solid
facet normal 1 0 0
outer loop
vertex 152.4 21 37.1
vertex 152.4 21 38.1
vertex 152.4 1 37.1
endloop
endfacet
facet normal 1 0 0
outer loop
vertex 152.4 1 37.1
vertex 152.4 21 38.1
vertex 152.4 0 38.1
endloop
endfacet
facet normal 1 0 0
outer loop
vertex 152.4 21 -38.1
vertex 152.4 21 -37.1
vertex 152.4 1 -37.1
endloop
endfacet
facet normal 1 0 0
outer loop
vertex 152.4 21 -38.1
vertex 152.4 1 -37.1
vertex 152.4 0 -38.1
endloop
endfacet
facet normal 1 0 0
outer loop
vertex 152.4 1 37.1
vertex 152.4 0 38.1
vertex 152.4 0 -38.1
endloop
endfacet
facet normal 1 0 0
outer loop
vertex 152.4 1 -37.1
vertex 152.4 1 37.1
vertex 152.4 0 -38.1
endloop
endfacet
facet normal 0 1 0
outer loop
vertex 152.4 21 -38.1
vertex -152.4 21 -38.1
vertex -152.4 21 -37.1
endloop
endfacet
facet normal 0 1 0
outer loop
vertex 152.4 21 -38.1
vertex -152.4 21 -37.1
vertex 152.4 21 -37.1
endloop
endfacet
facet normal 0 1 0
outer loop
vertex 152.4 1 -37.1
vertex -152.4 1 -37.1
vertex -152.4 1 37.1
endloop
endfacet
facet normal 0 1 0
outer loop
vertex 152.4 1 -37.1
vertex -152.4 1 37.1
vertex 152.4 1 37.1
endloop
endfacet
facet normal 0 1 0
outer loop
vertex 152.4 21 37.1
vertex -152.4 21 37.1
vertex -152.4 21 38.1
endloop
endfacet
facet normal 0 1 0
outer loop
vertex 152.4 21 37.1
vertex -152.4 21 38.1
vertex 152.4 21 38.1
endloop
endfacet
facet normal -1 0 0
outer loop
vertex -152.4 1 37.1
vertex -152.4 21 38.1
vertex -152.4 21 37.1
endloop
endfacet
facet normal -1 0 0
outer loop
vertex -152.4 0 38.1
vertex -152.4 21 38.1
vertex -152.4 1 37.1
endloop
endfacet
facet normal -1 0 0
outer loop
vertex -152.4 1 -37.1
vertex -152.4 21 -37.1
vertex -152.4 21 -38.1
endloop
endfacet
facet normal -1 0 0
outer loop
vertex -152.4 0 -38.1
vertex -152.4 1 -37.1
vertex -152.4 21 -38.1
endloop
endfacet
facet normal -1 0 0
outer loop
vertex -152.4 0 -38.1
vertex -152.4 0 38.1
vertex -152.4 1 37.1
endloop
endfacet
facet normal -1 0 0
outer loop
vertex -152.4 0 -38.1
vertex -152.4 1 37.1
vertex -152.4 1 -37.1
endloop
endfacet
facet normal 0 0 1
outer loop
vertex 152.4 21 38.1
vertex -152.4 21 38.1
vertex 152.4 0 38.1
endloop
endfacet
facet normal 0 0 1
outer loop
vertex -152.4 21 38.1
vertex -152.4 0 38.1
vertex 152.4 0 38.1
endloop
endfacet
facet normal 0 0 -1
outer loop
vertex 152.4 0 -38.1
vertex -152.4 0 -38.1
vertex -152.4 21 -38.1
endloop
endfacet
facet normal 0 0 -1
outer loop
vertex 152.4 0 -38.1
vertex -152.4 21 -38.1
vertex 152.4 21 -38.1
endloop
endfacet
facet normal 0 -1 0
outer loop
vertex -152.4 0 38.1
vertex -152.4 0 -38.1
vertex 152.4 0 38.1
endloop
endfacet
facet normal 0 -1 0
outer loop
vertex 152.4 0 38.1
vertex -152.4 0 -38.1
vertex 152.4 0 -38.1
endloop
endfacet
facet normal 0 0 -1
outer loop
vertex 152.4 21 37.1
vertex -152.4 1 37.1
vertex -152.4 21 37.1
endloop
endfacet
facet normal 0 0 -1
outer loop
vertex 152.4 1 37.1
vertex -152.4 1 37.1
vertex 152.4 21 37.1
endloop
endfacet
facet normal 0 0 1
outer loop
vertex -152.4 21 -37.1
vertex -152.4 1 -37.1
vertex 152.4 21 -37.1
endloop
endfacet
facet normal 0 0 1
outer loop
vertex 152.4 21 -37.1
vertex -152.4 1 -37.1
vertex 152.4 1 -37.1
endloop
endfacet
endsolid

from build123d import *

# Parameters (mm, degrees)
SKETCH1_W           = 304.8
SKETCH1_H           = 76.2
BOSS_EXTRUDE1_DEPTH = 1
SKETCH2_W           = 304.8
SKETCH2_H           = 1
EXTRUDE_THIN1_DEPTH = 20
SKETCH5_W           = 304.8
SKETCH5_H           = 1
EXTRUDE_THIN2_DEPTH = 20


with BuildPart() as part:
    # Sketch1 → Boss-Extrude1 (new body)
    with BuildSketch(Plane(origin=(0, 0, 0), x_dir=(1, 0, 0), z_dir=(0, 1, 0))):
        Rectangle(SKETCH1_W, SKETCH1_H)
    extrude(amount=BOSS_EXTRUDE1_DEPTH)

    # Sketch2 → Extrude-Thin1 (add)
    with BuildSketch(Plane(origin=(0, 1, 0), x_dir=(1, 0, 0), z_dir=(0, 1, 0))):
        with Locations((0, -37.6)):
            Rectangle(SKETCH2_W, SKETCH2_H)
    extrude(amount=EXTRUDE_THIN1_DEPTH)

    # Sketch5 → Extrude-Thin2 (add)
    with BuildSketch(Plane(origin=(0, 1, 0), x_dir=(1, 0, 0), z_dir=(0, 1, 0))):
        with Locations((0, 37.6)):
            Rectangle(SKETCH5_W, SKETCH5_H)
    extrude(amount=EXTRUDE_THIN2_DEPTH)


solid = part.part
